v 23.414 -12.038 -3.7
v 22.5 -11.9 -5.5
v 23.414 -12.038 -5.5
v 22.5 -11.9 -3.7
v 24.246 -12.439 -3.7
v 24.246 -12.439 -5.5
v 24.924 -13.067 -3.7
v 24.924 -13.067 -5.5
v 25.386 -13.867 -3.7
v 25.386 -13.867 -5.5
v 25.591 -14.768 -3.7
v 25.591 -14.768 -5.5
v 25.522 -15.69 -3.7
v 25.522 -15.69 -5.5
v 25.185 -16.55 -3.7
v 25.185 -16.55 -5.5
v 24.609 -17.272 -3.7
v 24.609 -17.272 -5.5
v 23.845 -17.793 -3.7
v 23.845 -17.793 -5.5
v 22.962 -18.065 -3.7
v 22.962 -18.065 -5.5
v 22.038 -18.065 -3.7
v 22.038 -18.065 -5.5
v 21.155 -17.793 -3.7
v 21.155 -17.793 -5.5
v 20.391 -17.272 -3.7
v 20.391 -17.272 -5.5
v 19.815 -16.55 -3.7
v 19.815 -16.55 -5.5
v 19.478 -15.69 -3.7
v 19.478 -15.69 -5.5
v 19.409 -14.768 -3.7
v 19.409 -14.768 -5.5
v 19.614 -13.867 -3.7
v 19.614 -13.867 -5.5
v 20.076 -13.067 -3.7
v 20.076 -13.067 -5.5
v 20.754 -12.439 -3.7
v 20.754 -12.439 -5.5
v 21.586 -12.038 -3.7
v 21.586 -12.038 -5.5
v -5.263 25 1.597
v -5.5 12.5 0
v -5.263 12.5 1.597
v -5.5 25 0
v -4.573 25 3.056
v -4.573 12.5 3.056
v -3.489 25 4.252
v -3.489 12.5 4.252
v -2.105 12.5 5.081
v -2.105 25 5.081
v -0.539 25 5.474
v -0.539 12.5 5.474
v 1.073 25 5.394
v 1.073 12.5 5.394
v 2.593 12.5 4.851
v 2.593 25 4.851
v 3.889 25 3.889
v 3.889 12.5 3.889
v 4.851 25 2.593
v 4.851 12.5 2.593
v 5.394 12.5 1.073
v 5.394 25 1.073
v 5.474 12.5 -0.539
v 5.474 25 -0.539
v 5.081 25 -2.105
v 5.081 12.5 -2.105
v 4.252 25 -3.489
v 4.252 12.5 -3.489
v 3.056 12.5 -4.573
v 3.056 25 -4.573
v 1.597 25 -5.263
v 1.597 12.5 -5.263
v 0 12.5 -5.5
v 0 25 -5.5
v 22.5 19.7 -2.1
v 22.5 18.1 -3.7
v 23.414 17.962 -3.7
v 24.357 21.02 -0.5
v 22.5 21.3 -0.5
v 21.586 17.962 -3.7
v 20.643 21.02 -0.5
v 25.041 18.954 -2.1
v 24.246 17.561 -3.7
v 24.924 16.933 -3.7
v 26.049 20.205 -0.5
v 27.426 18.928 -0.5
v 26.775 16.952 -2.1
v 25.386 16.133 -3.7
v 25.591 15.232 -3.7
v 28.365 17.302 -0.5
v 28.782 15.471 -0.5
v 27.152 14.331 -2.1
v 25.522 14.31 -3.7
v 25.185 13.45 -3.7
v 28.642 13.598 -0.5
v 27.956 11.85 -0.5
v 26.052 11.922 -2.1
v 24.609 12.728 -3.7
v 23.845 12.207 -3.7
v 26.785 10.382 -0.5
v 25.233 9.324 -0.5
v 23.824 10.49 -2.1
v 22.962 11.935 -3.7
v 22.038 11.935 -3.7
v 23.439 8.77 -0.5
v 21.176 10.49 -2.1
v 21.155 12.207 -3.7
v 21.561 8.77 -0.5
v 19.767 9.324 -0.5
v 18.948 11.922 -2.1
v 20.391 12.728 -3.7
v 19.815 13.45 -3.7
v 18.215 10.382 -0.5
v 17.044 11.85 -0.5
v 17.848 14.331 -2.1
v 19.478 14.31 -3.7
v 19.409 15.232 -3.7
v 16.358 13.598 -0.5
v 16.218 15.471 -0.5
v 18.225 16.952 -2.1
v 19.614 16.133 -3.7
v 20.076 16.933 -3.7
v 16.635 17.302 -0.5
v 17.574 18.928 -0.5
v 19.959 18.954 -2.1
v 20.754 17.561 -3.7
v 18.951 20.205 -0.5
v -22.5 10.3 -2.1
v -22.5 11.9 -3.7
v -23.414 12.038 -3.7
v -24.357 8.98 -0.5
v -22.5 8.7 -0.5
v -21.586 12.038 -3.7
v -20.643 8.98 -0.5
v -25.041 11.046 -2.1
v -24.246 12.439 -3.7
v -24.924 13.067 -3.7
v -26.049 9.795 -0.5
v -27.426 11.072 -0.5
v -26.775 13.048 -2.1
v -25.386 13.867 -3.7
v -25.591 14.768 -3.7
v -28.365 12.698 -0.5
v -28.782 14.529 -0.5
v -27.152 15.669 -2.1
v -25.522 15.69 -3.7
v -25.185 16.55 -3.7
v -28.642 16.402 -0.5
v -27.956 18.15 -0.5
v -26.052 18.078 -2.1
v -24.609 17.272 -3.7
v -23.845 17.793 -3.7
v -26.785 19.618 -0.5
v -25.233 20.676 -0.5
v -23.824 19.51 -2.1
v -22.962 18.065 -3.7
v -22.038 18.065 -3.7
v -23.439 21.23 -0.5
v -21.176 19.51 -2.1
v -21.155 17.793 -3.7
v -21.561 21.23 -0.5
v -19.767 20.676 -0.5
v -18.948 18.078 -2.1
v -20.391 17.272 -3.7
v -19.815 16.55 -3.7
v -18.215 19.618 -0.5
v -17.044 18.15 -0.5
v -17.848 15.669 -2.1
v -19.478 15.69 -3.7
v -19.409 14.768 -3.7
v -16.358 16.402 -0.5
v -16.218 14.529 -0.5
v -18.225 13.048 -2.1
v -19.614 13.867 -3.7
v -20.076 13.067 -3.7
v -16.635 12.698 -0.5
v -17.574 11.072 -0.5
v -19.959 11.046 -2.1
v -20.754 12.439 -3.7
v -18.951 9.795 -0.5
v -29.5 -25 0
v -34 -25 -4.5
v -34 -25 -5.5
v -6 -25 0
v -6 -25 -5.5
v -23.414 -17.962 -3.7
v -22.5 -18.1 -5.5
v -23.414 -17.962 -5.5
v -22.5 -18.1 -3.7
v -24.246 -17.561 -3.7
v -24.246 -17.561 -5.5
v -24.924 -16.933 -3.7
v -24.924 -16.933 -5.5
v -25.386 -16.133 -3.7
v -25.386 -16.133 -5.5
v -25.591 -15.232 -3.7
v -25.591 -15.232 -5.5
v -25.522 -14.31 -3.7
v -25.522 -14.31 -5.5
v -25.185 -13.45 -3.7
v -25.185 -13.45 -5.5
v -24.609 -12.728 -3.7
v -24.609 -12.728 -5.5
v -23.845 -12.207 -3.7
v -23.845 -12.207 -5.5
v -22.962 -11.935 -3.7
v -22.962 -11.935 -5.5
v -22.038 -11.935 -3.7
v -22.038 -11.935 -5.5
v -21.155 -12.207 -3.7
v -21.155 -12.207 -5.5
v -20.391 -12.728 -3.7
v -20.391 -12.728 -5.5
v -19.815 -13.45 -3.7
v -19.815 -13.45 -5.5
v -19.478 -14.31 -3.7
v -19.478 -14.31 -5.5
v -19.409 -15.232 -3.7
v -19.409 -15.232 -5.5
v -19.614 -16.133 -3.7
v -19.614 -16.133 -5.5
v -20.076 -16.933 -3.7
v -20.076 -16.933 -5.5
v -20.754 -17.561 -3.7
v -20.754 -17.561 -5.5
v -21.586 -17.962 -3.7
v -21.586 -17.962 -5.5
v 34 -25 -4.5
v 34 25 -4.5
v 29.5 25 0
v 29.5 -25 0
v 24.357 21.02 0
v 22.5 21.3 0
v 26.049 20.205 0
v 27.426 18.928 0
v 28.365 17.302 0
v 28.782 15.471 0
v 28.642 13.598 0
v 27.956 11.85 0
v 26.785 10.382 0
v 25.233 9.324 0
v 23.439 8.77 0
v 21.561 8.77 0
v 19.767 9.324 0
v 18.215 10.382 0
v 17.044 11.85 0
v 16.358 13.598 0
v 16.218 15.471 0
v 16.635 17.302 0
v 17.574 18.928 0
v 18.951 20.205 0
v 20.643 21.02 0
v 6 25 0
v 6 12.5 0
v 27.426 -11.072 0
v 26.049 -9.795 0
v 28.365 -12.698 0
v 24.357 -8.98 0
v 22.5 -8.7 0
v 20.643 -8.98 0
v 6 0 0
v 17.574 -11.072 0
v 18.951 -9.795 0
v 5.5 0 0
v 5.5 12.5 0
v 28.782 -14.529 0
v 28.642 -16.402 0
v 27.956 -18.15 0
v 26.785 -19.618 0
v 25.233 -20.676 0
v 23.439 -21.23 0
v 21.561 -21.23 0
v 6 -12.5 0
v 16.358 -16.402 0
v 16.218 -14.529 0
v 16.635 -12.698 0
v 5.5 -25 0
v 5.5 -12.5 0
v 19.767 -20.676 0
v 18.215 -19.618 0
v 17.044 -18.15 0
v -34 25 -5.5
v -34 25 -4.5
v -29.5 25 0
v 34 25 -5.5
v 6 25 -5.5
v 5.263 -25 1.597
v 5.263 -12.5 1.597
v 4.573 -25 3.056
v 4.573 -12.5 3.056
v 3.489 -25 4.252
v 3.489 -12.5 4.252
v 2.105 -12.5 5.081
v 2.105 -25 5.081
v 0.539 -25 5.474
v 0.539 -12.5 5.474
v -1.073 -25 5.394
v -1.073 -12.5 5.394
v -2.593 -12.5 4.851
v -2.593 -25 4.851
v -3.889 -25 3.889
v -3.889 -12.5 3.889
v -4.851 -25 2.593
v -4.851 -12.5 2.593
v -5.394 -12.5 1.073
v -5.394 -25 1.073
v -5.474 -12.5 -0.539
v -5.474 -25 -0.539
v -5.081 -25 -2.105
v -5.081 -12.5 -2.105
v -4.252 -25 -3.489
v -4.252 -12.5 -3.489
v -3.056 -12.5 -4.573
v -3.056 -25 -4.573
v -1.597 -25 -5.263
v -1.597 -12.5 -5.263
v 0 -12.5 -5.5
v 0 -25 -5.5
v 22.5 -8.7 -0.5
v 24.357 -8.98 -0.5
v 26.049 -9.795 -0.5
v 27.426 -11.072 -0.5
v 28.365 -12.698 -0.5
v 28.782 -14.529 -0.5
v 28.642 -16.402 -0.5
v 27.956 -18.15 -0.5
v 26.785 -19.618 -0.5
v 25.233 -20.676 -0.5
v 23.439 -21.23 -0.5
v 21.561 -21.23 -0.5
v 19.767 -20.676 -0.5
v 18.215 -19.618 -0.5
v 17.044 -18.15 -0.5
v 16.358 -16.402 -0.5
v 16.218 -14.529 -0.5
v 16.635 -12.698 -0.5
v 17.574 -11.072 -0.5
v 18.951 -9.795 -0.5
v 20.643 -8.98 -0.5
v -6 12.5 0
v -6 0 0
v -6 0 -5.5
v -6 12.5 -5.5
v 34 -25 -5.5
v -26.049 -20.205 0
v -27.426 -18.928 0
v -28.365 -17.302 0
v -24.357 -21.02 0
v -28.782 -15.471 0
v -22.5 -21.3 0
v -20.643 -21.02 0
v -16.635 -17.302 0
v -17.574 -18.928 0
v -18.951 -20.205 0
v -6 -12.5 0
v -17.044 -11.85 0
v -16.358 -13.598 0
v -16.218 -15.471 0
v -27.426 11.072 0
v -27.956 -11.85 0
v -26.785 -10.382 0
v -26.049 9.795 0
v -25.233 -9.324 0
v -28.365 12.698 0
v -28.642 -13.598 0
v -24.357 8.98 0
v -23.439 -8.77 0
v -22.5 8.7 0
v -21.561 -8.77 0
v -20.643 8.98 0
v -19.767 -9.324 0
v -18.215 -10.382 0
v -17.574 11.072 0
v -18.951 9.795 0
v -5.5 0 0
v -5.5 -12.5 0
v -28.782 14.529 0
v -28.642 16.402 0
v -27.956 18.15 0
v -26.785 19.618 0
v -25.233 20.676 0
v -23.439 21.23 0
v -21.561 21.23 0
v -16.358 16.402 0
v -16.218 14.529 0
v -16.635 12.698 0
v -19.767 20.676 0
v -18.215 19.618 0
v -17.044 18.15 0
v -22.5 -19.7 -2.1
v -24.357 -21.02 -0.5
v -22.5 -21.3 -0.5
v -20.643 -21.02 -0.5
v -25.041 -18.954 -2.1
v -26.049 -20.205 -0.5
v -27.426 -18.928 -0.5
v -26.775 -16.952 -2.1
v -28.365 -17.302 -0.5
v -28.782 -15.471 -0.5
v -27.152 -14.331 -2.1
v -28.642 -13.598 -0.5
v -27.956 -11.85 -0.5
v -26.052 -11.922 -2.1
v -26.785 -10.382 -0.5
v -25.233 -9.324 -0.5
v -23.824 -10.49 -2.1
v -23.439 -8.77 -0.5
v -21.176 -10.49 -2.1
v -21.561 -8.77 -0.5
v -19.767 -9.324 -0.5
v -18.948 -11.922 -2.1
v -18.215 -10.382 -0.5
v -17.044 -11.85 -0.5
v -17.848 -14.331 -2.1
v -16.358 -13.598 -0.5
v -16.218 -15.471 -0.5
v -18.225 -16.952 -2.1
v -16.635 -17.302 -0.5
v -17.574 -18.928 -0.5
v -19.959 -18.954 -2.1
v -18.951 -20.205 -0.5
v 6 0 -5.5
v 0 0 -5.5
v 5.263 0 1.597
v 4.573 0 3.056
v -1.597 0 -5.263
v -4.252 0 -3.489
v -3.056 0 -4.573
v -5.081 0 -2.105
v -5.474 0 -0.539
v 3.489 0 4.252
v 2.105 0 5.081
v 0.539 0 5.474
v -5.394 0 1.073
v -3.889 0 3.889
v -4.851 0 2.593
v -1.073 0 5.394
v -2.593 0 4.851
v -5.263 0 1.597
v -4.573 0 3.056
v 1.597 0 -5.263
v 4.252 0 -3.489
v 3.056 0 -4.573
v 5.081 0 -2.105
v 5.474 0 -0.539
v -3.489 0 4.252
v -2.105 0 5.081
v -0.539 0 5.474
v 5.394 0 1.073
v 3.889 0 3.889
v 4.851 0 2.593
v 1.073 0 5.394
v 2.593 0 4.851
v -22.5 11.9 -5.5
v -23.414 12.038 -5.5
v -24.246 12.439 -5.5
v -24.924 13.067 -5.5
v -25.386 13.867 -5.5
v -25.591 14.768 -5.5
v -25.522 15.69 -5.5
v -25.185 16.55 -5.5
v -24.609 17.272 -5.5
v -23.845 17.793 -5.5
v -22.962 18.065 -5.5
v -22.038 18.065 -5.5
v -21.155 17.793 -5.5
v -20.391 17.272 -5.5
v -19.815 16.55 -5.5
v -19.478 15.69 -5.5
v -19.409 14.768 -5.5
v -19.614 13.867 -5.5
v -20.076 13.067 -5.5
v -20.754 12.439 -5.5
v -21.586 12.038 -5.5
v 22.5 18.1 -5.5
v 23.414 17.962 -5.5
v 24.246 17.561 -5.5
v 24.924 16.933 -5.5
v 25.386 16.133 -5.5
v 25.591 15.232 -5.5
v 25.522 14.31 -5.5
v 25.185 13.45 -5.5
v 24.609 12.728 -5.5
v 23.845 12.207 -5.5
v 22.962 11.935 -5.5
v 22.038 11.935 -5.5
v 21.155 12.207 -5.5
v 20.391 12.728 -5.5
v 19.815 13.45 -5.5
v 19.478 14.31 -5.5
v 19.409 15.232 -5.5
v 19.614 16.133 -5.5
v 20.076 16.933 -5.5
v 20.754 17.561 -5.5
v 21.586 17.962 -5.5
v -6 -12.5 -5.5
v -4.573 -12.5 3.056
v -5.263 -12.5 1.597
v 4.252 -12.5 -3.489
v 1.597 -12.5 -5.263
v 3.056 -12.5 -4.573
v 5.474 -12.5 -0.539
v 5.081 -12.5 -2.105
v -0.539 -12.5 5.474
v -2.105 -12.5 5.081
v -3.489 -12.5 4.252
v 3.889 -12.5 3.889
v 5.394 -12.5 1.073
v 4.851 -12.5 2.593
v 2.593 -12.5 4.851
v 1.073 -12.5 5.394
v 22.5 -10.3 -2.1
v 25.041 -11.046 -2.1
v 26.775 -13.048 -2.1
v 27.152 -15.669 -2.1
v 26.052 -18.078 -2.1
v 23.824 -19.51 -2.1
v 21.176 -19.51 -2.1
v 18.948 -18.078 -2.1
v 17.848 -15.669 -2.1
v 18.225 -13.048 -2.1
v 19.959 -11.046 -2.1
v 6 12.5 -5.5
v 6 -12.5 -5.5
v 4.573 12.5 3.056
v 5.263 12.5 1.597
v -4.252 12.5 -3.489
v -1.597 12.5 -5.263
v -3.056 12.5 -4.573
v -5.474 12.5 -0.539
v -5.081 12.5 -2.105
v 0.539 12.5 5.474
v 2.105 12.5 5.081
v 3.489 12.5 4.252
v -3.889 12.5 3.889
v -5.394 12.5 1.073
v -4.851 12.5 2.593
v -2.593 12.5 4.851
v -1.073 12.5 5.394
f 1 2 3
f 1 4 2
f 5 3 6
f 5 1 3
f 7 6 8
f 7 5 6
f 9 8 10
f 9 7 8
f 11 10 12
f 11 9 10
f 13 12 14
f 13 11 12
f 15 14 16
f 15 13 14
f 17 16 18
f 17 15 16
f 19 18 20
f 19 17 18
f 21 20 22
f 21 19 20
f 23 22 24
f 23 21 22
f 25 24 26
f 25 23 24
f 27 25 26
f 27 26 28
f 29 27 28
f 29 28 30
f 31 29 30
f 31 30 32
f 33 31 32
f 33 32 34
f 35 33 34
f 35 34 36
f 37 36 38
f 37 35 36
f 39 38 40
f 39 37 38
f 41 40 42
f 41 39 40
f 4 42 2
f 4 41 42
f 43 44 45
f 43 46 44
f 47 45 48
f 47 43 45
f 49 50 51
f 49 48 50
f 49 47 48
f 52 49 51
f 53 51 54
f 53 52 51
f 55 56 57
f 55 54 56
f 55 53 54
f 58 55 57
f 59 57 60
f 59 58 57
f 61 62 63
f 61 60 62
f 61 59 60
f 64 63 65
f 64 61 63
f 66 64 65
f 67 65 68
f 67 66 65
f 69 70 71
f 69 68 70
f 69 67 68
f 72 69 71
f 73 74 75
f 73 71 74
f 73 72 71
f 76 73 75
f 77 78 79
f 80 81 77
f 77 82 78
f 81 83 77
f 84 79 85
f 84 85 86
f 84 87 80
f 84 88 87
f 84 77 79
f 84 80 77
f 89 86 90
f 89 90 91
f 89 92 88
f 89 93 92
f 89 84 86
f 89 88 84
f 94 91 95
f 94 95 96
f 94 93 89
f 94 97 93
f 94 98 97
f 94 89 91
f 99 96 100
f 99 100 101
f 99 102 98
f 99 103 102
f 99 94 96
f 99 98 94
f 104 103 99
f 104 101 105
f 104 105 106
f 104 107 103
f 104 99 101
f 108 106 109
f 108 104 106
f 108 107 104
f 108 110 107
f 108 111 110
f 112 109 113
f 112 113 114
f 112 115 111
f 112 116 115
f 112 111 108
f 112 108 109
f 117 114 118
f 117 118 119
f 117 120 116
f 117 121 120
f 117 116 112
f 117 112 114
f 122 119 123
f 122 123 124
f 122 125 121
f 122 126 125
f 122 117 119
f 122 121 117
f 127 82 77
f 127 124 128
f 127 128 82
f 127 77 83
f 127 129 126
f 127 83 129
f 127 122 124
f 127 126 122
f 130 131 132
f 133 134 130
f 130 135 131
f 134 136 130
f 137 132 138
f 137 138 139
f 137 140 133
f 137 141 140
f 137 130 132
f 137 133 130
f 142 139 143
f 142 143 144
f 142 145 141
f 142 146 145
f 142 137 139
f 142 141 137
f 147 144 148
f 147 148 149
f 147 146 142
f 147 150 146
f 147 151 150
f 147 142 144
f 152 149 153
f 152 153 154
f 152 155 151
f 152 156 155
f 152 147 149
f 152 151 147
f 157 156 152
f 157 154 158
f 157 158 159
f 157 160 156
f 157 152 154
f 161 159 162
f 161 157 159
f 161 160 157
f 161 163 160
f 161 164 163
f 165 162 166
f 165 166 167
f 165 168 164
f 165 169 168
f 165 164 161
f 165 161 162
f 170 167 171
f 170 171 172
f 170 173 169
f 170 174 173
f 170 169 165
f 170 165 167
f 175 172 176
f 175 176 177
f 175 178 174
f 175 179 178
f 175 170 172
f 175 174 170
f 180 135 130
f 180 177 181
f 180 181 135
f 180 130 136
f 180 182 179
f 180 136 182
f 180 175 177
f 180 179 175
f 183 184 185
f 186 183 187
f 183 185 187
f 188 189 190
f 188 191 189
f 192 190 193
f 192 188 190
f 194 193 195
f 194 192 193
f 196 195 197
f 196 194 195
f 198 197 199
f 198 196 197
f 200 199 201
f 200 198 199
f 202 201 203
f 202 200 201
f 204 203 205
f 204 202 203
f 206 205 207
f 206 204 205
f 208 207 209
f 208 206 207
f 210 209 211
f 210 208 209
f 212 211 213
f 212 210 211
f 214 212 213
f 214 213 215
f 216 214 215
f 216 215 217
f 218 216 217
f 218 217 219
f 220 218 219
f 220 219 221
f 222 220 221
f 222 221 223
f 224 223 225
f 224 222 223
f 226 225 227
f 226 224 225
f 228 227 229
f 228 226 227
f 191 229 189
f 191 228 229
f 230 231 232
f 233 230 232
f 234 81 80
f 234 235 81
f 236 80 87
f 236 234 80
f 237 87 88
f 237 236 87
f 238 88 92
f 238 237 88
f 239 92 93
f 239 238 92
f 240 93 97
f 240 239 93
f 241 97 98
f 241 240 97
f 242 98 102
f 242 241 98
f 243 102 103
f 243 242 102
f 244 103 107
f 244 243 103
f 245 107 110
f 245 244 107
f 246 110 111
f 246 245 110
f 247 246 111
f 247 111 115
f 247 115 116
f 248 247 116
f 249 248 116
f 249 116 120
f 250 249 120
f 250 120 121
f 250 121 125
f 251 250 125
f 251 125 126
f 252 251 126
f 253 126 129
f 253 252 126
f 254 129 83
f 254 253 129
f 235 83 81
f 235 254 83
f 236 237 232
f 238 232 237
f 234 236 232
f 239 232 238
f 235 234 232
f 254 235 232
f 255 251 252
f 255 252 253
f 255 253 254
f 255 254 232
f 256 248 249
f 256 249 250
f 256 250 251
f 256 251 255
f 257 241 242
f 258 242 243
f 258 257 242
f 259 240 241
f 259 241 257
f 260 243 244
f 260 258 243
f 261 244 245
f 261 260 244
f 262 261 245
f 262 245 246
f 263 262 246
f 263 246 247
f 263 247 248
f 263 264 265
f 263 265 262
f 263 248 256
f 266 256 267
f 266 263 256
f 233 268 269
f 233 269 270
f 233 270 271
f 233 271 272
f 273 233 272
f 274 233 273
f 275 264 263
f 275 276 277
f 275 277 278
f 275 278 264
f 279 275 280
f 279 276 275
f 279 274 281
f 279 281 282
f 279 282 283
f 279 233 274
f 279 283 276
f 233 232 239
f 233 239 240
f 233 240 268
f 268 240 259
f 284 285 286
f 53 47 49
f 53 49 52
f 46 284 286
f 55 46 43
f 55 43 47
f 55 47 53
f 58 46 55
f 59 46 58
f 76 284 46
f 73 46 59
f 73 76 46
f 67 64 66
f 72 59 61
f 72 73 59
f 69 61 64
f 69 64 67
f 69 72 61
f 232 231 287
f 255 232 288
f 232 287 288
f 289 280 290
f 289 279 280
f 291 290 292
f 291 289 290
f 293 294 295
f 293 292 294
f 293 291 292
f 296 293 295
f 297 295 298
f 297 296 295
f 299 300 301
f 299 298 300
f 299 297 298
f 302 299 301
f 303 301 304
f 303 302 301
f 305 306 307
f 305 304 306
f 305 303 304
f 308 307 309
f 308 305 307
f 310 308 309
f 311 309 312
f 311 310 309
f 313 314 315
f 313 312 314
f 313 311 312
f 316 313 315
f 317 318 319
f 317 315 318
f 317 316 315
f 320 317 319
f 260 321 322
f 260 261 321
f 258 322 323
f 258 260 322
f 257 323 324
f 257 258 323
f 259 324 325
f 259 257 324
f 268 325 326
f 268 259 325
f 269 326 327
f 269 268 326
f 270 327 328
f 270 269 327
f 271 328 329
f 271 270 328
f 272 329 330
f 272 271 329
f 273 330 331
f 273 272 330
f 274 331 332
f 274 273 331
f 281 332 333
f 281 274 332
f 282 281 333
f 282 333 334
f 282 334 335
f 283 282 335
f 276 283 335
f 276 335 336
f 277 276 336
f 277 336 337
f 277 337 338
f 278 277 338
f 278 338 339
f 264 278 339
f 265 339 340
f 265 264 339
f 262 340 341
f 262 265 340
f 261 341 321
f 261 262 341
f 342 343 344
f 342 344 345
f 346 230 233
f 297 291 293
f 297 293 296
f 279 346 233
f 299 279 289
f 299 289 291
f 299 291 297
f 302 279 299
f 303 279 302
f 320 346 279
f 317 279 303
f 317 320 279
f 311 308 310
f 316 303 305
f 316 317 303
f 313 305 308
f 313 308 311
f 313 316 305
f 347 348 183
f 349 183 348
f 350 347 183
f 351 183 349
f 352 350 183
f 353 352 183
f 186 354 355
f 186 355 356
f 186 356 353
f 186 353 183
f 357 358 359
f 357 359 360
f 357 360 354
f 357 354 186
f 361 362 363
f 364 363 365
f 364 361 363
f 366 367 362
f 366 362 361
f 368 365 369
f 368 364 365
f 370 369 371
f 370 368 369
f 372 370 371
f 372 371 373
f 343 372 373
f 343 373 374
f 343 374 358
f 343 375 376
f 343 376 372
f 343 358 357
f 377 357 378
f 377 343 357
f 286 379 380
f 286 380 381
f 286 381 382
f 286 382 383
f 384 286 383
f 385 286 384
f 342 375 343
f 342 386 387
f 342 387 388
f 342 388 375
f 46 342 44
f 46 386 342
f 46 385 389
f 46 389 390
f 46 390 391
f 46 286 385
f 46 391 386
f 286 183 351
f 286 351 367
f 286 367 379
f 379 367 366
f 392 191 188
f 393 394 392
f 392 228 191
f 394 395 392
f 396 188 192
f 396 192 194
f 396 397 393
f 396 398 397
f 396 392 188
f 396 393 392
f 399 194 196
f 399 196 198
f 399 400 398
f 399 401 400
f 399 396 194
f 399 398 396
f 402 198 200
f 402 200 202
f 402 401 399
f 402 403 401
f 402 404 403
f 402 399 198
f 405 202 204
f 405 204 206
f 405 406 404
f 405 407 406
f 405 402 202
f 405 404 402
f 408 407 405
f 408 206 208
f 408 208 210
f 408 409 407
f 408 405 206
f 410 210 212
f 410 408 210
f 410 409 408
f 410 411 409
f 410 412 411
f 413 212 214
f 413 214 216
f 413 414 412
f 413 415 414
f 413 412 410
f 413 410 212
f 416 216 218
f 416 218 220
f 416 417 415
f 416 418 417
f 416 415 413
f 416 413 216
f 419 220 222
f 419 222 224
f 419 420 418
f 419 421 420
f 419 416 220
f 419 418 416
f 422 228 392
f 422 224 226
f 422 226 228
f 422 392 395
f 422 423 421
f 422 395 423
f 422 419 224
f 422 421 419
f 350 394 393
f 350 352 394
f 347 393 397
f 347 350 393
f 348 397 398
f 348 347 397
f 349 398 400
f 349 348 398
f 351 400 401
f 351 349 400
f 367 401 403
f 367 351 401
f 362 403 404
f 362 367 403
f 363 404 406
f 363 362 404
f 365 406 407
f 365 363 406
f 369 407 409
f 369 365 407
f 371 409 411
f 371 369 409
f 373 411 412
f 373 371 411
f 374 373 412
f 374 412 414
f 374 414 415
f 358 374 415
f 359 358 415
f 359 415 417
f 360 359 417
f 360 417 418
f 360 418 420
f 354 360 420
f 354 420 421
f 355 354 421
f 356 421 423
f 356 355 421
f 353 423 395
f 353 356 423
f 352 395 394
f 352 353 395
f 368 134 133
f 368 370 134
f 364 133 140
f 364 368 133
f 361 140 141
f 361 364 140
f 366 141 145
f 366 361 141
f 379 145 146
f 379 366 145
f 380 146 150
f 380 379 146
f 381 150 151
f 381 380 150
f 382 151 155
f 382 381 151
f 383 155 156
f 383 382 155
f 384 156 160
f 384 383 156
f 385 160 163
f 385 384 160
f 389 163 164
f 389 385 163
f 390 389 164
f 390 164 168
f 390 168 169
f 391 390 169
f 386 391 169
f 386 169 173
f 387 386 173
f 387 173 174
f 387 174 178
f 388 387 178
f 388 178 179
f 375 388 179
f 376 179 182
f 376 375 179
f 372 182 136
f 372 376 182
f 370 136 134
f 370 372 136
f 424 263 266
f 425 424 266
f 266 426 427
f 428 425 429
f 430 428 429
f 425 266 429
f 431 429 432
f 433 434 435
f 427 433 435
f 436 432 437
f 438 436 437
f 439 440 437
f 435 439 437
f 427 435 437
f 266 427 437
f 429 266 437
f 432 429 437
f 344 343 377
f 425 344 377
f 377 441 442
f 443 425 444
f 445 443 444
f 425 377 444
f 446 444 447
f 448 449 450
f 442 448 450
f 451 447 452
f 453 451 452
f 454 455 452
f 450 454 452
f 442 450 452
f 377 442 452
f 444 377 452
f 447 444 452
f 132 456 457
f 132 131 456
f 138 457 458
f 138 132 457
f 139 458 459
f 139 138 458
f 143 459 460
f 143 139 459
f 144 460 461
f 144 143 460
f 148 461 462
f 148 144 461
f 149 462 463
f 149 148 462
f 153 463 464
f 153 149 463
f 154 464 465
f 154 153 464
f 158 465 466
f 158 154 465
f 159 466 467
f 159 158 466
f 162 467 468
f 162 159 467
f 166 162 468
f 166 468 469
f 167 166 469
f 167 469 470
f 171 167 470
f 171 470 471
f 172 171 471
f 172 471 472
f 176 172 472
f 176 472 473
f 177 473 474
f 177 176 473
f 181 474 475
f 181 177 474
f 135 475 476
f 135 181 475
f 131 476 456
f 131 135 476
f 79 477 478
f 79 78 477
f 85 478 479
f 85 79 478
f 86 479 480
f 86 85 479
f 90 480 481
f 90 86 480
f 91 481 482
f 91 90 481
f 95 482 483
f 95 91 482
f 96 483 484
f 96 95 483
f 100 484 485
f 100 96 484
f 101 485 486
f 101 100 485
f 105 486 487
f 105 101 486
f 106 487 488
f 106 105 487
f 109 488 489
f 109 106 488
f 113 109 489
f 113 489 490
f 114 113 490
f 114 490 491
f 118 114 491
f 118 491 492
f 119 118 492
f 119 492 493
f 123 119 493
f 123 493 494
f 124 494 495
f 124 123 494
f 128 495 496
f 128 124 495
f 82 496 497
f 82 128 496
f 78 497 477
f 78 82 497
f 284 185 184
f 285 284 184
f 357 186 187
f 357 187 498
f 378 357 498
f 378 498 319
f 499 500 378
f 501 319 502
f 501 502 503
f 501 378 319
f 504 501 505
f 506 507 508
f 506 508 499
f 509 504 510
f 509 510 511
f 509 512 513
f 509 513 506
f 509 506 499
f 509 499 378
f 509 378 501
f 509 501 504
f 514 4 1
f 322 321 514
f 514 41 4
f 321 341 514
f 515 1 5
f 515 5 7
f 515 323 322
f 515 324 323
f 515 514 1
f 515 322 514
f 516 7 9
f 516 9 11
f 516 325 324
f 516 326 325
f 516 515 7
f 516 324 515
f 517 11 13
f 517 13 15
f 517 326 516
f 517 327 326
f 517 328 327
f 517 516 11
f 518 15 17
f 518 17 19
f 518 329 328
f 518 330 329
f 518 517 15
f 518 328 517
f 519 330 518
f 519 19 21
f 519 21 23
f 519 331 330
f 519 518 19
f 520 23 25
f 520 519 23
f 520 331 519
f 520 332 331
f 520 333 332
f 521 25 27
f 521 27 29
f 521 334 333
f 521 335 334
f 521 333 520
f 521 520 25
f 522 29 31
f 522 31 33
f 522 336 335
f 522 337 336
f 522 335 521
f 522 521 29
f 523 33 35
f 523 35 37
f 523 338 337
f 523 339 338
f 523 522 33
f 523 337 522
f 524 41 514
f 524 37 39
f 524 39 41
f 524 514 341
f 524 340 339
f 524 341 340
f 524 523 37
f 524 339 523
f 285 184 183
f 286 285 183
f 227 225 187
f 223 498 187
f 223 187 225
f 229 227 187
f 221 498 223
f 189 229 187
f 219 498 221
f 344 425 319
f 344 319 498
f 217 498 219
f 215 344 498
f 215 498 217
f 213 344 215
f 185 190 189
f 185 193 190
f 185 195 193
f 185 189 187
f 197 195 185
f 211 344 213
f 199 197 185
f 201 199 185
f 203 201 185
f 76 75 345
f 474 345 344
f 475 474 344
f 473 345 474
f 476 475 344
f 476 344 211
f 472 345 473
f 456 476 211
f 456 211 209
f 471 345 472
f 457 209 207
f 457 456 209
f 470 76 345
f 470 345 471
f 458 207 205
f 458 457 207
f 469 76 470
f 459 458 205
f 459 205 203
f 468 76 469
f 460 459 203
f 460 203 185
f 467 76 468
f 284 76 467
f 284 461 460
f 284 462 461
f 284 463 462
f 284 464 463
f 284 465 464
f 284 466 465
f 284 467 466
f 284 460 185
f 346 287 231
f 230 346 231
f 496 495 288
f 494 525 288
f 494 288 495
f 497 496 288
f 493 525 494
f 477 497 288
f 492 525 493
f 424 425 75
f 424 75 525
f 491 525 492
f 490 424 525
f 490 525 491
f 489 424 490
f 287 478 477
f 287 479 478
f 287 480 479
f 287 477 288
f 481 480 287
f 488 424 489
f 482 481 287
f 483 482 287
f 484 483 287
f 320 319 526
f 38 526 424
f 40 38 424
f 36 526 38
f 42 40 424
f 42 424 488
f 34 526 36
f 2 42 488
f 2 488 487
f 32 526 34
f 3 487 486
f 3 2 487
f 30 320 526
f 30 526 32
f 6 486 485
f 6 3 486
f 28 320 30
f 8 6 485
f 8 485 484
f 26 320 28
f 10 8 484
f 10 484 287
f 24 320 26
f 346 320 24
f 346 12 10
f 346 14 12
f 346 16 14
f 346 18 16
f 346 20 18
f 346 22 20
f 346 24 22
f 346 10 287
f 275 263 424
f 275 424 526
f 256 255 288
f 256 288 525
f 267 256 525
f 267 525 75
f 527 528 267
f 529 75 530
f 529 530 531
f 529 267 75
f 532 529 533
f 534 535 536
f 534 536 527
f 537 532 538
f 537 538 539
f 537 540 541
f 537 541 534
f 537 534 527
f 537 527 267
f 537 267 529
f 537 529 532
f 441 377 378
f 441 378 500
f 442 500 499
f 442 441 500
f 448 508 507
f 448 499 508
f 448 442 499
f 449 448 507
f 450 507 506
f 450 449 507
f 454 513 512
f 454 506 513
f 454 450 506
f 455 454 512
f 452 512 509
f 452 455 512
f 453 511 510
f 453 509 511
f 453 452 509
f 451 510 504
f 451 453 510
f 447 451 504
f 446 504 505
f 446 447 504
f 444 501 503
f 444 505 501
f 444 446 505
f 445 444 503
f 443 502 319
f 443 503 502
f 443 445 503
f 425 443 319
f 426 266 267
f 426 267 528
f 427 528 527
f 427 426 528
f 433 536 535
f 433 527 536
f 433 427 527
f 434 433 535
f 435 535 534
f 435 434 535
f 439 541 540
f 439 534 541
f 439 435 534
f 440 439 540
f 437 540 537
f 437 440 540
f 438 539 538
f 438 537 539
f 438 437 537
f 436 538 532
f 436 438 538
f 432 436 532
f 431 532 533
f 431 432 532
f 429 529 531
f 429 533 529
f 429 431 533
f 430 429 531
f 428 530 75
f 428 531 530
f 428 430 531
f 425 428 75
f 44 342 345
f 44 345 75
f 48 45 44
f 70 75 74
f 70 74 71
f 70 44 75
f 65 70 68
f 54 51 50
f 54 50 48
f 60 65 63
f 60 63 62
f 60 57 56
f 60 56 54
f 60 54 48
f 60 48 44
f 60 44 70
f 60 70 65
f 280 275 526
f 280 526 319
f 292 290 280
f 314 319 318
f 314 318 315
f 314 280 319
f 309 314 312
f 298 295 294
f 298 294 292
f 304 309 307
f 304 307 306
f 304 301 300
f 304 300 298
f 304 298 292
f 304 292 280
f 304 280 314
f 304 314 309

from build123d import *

# Parameters (mm, degrees)
EXTRUDE_1_DEPTH            = 25
SKETCH_3_W                 = 11.5
SKETCH_3_H                 = 12.5
CUT_EXTRUDE_1_DEPTH        = 6.5
CUT_EXTRUDE_1_DEPTH_BACK   = 6.5
HOLE_WIZARD_M61_AT_2_COUNT = 2
HOLE_WIZARD_M61_AT_2_PITCH = 30
PATTERN_CIRCULAR_1_COUNT   = 2


with BuildPart() as part:
    # Эскиз1 → Бобышка-Вытянуть1 (new body, symmetric)
    with BuildSketch(Plane(origin=(0, 0, 0), x_dir=(1, 0, 0), z_dir=(0, 1, 0))):
        with BuildLine():
            Line((0, 5.5), (-34, 5.5))
            Line((-34, 5.5), (-34, 4.5))
            Line((-34, 4.5), (-29.5, 0))
            Line((-29.5, 0), (-5.5, 0))
            ThreePointArc((-5.5, 0), (3.889087297, -3.889087297), (0, 5.5))
        make_face()
    extrude(amount=EXTRUDE_1_DEPTH, both=True)

    # Эскиз3 → Вырез-Вытянуть1 (cut, two sides)
    with BuildSketch(Plane.XY) as cut_extrude_1_sk:
        with Locations((-0.25, 6.25)):
            Rectangle(SKETCH_3_W, SKETCH_3_H)
        with Locations((-0.25, -18.75)):
            Rectangle(SKETCH_3_W, SKETCH_3_H)
    extrude(amount=CUT_EXTRUDE_1_DEPTH, mode=Mode.SUBTRACT)
    extrude(cut_extrude_1_sk.sketch, amount=-CUT_EXTRUDE_1_DEPTH_BACK, mode=Mode.SUBTRACT)

    # Эскиз6 → Зенковка для винта с полупотайной головкой M61 (revolve, cut)
    with BuildSketch(Plane(origin=(-22.5, 15, 0), x_dir=(0, -1, 0), z_dir=(1, 0, 0))):
        Polygon((0, 0), (0, 5.5), (3.1, 5.5), (3.1, 3.7), (6.3, 0.5), (6.3, 0), align=None)
    hole_wizard_m61 = revolve(axis=Axis((-22.5, 15, 6.35), (0, 0, -1)), mode=Mode.SUBTRACT)

    # Зенковка для винта с полупотайной головкой M61 at 2: Зенковка для винта с полупотайной головкой M61 ×2
    with Locations(*[(0, -i * HOLE_WIZARD_M61_AT_2_PITCH, 0) for i in range(1, HOLE_WIZARD_M61_AT_2_COUNT)]):
        add(hole_wizard_m61, mode=Mode.SUBTRACT)


with BuildPart() as pattern_circular_1_1:
    # Круговой массив1: pattern copy
    add(part.part.rotate(Axis((0, 0, 0), (0, 0, 1)), 1 * 360 / PATTERN_CIRCULAR_1_COUNT))


solid = Compound([part.part, pattern_circular_1_1.part])
